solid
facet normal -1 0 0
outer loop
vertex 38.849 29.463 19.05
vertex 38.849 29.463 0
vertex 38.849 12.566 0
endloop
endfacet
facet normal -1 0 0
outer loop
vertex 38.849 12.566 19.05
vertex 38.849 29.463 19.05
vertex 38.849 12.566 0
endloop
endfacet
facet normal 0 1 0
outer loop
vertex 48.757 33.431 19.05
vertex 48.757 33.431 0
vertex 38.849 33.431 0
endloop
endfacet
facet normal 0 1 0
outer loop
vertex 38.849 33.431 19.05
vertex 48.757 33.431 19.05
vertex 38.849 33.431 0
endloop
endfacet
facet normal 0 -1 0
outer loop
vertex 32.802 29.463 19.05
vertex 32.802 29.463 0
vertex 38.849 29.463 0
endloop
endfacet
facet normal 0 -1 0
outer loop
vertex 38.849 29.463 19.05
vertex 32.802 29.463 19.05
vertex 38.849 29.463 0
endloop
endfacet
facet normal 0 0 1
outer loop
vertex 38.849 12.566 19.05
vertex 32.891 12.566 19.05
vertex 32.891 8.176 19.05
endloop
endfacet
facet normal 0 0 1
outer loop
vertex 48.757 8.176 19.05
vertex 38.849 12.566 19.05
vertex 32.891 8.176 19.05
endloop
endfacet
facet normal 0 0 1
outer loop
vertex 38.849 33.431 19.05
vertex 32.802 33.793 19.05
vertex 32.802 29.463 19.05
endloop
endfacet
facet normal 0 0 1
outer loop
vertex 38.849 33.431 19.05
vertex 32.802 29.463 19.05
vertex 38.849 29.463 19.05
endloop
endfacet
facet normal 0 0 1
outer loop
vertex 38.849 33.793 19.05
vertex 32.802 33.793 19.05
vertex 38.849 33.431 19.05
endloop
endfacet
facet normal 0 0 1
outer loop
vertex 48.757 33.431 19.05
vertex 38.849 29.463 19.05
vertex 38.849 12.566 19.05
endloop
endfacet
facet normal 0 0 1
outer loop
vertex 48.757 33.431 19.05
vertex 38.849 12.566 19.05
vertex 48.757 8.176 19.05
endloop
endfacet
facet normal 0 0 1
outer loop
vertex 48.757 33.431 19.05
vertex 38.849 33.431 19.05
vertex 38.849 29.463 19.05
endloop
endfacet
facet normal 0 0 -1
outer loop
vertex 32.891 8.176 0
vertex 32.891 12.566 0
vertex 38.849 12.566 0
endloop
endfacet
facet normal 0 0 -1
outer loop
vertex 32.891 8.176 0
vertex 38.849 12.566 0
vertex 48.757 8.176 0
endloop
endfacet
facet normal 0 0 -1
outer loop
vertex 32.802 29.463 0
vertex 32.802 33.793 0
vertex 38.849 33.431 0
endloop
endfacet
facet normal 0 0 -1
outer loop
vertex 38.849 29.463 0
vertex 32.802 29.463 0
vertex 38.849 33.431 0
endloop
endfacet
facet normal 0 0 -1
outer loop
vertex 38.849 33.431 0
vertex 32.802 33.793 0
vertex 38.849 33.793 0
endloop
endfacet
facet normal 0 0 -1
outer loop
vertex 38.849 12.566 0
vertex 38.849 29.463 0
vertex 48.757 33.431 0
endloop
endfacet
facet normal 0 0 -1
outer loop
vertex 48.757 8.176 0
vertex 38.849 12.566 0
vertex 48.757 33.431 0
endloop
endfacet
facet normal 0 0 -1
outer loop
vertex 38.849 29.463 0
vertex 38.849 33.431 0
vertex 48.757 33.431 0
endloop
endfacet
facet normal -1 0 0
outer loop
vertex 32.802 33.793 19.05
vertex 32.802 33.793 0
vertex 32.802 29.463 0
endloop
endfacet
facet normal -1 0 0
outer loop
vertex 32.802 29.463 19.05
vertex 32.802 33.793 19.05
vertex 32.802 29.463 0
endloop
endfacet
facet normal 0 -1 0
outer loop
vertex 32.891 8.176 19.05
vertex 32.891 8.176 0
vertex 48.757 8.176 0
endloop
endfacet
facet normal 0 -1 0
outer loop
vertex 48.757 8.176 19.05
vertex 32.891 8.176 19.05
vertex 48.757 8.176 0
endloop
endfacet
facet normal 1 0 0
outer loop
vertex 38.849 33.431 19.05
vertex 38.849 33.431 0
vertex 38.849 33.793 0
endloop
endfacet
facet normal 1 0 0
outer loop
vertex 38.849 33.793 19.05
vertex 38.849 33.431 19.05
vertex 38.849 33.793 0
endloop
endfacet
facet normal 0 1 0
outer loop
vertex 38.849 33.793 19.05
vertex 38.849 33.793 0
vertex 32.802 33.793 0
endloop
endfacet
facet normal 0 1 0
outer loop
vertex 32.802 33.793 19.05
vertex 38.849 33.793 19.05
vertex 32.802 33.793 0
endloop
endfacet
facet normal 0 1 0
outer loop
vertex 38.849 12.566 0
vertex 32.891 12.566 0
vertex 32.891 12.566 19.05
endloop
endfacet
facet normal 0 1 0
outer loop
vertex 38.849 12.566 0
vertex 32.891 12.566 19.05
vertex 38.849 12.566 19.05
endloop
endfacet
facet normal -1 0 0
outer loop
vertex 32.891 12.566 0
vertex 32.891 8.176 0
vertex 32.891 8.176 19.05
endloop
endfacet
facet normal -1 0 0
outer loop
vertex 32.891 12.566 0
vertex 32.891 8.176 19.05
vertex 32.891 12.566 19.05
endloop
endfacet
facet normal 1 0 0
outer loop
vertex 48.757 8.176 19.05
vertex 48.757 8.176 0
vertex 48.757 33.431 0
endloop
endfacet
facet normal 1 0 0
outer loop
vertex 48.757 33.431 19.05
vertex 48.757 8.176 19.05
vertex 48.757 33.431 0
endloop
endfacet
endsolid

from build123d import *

# Parameters (mm, degrees)
F2_W     = 5.9578604996
F2_H     = 4.390229471
F3_DEPTH = 19.05


# Not quite as in the source:
# - the program builds the solid bodies; features that only make, move or delete a surface that nothing else refers to are left out


with BuildPart() as f3:
    # F2 (on Top) → F3 (new body)
    with BuildSketch(Plane.XY):
        Polygon((48.7568192184, 33.4314107895), (38.8487800956, 33.4314107895), (38.8487800956, 29.4627081603), (38.8487800956, 12.5663736835), (38.8487800956, 8.1761442125), (48.7568192184, 8.1761442125), align=None)
        Polygon((38.8487800956, 29.4627081603), (38.8487800956, 33.4314107895), (38.8487800956, 33.7930396199), (32.8023135662, 33.7930396199), (32.8023135662, 29.4627081603), align=None)
        with Locations((35.8698498458, 10.371258948)):
            Rectangle(F2_W, F2_H)
    extrude(amount=F3_DEPTH)


solid = f3.part
